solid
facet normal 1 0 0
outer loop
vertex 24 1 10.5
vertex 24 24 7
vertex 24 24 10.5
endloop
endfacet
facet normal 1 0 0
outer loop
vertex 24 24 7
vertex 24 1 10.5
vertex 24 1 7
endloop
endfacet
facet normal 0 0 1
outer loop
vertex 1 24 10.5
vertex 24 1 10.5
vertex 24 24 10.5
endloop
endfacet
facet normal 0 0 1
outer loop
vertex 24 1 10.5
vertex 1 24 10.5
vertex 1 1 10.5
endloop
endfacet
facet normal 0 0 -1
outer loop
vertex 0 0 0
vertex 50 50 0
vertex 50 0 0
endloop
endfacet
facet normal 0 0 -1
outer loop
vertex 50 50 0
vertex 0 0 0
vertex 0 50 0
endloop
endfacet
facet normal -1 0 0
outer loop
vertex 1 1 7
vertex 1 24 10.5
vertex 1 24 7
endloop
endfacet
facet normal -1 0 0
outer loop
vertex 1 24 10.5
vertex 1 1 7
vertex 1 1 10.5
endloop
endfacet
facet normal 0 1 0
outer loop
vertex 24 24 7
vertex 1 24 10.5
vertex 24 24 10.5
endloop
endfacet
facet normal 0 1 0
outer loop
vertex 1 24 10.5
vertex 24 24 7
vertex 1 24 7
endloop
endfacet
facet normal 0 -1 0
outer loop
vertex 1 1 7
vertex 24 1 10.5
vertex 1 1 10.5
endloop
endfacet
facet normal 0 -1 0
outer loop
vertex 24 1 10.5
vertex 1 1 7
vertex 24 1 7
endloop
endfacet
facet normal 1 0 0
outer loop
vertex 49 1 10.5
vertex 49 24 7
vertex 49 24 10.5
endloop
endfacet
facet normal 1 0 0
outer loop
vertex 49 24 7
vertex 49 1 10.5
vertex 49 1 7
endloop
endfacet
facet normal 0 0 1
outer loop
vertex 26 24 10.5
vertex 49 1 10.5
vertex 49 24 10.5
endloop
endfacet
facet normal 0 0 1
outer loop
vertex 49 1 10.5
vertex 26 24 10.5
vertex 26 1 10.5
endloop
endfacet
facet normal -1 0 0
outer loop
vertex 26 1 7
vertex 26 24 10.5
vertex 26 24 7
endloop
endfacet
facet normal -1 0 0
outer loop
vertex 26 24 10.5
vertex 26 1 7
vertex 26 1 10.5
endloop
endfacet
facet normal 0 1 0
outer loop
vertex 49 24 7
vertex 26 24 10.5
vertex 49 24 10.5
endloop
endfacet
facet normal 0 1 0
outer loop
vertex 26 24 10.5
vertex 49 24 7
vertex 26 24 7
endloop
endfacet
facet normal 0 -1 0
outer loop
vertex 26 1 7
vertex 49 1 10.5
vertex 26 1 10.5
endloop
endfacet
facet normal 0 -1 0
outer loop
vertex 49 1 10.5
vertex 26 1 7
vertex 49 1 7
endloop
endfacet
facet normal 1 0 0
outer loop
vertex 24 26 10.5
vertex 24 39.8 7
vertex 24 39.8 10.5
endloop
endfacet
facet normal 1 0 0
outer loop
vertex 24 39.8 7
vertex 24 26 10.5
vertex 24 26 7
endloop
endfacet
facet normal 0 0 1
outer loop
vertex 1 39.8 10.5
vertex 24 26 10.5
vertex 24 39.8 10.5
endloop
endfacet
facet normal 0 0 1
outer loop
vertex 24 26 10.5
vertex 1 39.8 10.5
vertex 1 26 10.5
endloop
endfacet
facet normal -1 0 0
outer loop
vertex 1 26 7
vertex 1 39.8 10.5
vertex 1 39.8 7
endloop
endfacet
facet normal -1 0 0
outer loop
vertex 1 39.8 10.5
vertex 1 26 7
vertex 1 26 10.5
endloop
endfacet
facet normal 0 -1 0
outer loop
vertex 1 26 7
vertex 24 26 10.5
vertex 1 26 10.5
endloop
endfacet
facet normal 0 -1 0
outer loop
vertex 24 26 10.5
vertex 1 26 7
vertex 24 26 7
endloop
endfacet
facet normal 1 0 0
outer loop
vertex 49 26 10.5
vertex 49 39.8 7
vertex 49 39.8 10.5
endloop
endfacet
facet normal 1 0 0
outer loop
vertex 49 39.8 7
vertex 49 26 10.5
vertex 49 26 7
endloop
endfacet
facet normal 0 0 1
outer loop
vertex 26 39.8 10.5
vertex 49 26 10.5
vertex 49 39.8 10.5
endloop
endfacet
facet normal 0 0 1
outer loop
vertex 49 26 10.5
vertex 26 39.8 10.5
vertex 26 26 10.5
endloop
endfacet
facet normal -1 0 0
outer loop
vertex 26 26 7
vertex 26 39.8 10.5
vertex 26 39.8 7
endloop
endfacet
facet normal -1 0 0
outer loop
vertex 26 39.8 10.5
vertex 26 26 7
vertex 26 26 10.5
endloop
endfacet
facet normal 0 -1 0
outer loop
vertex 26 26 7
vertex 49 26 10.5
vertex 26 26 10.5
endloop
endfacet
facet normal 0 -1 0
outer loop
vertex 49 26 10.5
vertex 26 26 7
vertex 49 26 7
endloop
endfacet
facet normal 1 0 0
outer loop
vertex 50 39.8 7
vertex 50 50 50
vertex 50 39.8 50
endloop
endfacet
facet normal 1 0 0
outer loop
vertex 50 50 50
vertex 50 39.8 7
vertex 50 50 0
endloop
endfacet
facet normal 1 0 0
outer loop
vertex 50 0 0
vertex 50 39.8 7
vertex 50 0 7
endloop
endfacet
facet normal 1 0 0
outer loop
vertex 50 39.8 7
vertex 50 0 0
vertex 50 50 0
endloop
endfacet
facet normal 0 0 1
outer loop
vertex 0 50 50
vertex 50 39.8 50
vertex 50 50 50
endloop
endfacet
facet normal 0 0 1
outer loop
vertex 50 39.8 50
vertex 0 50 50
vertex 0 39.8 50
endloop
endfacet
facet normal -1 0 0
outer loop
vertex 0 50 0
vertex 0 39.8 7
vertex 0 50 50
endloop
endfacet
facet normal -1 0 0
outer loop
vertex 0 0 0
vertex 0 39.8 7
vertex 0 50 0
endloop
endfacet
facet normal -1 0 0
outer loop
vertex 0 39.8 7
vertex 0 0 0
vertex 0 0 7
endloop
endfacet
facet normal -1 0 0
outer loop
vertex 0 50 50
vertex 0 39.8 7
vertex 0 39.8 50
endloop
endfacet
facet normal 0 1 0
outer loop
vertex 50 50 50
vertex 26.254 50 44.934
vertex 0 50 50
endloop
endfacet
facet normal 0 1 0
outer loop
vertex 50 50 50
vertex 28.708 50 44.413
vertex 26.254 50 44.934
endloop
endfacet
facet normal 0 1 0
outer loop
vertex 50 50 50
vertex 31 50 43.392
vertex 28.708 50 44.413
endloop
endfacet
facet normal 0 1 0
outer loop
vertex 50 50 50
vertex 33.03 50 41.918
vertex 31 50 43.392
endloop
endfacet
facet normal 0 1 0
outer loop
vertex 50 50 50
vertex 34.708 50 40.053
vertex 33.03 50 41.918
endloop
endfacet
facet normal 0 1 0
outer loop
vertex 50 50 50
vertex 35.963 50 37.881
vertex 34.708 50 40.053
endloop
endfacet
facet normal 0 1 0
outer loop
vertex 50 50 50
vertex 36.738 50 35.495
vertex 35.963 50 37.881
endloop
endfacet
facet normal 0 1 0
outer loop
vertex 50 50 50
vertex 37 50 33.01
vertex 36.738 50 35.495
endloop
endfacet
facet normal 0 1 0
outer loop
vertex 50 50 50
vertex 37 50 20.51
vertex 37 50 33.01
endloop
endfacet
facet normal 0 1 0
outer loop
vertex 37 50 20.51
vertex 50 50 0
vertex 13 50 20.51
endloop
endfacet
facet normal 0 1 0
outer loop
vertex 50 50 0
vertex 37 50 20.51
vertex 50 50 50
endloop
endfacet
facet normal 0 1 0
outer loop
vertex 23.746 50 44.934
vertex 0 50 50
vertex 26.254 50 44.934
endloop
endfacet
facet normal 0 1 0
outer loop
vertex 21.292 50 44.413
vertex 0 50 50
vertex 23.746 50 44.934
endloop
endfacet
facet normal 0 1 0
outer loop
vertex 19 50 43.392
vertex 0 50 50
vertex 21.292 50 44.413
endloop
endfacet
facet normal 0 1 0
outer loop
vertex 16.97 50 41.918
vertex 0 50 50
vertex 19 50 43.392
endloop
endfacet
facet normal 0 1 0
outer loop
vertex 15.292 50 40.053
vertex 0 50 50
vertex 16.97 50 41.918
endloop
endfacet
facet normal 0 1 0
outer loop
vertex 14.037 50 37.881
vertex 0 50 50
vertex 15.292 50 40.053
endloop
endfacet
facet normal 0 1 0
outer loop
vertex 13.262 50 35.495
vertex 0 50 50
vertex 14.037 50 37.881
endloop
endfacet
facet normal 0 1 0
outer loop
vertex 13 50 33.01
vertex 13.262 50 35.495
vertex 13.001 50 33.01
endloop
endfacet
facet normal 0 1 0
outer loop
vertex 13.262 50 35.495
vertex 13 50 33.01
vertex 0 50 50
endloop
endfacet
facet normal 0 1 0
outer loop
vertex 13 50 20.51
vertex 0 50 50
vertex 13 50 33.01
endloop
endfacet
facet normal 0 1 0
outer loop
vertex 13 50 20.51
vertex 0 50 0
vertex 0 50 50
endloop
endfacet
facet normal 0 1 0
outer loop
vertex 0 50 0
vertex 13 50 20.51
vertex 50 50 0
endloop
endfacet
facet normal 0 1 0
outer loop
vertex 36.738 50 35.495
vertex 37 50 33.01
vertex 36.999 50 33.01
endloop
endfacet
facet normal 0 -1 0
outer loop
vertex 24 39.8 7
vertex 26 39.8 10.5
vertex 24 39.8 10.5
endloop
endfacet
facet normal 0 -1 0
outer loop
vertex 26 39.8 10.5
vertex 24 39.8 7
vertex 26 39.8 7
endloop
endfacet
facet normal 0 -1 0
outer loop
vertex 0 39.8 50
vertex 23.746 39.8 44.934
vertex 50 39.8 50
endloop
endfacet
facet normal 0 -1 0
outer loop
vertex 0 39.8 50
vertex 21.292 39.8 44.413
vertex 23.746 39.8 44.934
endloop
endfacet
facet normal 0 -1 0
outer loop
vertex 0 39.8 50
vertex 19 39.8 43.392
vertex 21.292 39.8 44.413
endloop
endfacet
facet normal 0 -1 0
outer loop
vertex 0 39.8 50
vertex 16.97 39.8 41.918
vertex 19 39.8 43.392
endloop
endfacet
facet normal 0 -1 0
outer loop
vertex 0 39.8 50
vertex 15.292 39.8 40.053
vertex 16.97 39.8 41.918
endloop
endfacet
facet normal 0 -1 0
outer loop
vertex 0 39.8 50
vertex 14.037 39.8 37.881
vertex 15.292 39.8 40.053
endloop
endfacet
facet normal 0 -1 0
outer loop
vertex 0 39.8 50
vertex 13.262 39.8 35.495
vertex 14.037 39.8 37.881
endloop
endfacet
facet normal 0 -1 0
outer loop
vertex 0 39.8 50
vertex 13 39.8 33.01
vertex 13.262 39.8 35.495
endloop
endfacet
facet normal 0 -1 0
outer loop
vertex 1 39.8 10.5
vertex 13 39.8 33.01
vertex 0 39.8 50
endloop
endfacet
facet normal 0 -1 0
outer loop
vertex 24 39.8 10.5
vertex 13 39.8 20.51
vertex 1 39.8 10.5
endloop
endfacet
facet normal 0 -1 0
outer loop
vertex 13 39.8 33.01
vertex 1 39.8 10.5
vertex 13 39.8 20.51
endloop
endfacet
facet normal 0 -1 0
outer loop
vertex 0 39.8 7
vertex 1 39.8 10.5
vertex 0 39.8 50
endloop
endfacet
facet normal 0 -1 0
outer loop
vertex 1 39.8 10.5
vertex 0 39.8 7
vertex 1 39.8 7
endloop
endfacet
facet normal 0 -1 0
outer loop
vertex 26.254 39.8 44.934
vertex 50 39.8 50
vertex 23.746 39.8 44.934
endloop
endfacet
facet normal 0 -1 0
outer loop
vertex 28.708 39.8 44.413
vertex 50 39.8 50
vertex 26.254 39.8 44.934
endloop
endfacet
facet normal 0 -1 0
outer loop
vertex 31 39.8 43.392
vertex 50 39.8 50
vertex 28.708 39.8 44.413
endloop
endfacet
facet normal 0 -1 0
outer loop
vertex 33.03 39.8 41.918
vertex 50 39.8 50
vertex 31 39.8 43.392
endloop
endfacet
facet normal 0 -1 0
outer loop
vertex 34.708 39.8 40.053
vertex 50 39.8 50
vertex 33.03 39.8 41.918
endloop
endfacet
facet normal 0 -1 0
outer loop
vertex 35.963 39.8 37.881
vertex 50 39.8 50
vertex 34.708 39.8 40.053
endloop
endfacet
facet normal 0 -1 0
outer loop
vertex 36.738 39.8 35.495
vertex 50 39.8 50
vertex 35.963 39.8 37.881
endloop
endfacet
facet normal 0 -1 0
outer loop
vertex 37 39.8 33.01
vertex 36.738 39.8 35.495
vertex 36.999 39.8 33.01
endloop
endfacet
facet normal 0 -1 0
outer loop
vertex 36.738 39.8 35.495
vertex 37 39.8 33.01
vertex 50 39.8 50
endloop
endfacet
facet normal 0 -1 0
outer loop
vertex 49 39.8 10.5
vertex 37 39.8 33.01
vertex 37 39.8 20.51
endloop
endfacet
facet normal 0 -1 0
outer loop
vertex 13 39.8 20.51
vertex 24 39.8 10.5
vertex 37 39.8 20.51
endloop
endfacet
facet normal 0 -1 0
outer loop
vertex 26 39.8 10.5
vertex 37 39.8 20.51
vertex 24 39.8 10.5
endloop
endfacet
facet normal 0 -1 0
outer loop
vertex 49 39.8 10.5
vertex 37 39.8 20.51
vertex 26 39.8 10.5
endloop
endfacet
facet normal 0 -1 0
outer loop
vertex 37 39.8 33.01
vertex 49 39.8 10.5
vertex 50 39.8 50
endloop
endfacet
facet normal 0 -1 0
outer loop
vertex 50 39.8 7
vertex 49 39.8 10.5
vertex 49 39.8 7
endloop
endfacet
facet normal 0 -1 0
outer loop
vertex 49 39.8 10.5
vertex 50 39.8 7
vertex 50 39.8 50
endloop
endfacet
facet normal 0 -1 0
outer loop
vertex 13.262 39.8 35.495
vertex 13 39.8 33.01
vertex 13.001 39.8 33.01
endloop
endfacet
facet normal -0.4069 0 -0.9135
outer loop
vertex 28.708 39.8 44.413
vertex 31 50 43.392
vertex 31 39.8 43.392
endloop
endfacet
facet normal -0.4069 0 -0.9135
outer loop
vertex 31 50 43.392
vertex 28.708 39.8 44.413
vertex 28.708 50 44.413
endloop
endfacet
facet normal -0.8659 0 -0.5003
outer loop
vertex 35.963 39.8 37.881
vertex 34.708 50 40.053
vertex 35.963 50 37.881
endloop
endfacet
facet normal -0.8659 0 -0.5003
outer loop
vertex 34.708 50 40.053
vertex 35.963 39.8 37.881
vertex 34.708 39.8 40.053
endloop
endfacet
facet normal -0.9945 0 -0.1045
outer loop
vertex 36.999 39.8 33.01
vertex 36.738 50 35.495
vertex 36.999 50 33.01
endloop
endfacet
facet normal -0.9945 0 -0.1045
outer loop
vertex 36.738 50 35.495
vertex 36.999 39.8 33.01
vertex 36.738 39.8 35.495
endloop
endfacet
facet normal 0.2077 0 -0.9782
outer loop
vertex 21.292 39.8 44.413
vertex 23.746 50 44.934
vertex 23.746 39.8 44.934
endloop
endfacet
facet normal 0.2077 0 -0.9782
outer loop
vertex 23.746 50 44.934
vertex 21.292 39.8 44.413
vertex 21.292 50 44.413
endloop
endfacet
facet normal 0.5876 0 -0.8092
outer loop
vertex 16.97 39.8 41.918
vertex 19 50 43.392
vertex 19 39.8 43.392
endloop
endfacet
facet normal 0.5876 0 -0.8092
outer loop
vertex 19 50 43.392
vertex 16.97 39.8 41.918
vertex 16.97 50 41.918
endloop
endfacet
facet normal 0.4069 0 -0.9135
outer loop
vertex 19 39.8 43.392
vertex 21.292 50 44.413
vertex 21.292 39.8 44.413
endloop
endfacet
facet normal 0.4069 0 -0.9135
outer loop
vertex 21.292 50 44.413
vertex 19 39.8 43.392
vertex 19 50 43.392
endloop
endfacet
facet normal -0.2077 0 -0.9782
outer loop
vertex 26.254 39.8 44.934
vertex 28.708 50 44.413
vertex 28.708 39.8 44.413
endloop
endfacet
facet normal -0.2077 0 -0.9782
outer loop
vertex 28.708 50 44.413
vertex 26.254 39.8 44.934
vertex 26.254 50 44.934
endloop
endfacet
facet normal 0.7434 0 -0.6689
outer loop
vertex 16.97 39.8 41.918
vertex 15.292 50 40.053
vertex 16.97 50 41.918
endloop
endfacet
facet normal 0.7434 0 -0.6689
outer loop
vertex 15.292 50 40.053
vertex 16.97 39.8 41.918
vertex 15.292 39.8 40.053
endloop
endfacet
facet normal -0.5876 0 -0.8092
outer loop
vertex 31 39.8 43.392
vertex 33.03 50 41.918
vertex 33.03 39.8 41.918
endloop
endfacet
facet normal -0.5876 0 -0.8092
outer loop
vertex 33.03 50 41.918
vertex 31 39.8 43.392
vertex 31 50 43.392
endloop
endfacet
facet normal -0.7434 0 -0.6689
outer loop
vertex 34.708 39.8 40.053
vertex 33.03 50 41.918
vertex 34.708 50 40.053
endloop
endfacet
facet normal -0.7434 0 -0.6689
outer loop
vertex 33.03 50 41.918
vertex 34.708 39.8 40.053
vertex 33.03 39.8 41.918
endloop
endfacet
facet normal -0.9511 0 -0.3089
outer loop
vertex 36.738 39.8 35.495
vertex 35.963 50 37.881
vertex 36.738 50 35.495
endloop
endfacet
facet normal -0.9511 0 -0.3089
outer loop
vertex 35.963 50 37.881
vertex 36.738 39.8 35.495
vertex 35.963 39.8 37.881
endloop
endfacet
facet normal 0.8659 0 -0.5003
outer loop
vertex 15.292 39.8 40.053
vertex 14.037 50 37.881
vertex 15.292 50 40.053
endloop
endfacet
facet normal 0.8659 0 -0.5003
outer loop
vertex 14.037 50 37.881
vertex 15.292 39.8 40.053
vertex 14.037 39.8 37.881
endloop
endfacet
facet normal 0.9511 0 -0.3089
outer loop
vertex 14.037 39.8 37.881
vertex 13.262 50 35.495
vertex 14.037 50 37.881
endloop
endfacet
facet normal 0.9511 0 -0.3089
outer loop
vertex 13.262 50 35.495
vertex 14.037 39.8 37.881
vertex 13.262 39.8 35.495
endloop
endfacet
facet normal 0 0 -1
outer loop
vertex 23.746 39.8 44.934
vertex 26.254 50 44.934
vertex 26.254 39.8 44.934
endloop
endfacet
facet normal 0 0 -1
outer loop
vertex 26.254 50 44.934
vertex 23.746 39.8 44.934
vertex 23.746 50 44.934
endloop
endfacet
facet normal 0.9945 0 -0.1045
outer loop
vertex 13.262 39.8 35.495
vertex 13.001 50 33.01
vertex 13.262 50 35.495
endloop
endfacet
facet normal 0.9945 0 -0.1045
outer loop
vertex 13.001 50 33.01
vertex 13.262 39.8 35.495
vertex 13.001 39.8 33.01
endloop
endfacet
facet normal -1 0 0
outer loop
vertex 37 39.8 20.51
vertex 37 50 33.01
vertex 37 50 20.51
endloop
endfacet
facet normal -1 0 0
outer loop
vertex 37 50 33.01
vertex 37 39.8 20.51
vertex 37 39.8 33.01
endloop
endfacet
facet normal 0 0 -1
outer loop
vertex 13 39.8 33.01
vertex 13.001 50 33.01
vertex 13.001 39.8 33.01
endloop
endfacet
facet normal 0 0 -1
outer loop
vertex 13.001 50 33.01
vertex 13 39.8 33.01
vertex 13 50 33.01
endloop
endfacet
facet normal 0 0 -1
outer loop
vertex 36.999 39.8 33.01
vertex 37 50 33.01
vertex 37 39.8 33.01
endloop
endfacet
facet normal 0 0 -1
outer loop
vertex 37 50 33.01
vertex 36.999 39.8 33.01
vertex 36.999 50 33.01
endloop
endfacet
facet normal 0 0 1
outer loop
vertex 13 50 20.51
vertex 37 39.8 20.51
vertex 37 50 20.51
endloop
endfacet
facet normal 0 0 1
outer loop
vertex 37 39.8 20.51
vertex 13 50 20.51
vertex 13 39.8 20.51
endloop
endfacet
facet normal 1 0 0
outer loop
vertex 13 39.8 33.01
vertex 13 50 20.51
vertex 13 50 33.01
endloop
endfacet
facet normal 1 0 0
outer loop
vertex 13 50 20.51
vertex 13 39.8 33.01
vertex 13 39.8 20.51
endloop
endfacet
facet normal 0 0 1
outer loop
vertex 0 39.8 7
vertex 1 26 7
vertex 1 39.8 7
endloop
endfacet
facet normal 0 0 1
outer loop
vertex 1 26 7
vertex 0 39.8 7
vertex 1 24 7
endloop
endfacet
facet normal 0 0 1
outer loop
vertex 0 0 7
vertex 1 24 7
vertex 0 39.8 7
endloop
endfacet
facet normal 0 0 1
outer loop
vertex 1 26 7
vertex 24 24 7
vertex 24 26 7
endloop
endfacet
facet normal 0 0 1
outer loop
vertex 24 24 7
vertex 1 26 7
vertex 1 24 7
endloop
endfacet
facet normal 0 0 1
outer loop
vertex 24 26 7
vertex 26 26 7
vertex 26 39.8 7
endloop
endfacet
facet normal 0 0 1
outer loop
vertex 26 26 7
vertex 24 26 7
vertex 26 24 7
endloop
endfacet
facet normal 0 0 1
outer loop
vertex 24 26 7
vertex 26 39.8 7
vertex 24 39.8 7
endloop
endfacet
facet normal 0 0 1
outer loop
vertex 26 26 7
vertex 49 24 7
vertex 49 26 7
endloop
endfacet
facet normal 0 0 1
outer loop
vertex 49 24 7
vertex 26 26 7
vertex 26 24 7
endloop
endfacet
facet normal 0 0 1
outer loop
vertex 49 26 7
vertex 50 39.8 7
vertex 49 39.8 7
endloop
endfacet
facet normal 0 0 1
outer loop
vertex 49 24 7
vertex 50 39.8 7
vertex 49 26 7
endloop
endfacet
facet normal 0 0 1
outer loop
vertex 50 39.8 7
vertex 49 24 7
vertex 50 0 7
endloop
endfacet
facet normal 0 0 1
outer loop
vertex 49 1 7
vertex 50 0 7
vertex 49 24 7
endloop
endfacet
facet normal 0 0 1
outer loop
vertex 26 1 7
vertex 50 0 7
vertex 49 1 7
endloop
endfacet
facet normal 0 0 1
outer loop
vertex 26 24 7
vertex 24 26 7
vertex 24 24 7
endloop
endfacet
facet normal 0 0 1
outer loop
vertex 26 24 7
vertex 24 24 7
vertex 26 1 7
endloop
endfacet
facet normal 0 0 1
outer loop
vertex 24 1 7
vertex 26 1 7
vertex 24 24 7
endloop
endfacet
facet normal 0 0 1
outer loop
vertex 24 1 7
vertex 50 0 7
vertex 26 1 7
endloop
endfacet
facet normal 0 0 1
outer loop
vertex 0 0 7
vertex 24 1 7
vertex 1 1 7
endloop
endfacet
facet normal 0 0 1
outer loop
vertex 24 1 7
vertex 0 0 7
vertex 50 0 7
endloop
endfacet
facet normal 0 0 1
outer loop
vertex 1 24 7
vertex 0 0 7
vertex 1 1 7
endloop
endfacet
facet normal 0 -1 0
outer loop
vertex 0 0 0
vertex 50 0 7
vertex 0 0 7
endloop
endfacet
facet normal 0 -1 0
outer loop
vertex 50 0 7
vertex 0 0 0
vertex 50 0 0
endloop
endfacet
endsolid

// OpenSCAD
color("LightGray") {
    translate([1,1,0]) cube([23,23,6+4.5]);
    translate([25+1,1,0]) cube([23,23,6+4.5]);
    translate([1,25+1,0]) cube([23,23,6+4.5]);
    translate([25+1,25+1,0]) cube([23,23,6+4.5]);
}
color("Grey") {
    cube([50,50,6+1]);
    difference() {
        translate([0,50-10.2,0]) cube([50,10.2,50]);
        translate([25,25,6+27]) rotate([-90,0,0]) cylinder(50,12,12);
        translate([13,25,6+4.51+10]) cube([24,50,27-4.5-10]);
    }
}
